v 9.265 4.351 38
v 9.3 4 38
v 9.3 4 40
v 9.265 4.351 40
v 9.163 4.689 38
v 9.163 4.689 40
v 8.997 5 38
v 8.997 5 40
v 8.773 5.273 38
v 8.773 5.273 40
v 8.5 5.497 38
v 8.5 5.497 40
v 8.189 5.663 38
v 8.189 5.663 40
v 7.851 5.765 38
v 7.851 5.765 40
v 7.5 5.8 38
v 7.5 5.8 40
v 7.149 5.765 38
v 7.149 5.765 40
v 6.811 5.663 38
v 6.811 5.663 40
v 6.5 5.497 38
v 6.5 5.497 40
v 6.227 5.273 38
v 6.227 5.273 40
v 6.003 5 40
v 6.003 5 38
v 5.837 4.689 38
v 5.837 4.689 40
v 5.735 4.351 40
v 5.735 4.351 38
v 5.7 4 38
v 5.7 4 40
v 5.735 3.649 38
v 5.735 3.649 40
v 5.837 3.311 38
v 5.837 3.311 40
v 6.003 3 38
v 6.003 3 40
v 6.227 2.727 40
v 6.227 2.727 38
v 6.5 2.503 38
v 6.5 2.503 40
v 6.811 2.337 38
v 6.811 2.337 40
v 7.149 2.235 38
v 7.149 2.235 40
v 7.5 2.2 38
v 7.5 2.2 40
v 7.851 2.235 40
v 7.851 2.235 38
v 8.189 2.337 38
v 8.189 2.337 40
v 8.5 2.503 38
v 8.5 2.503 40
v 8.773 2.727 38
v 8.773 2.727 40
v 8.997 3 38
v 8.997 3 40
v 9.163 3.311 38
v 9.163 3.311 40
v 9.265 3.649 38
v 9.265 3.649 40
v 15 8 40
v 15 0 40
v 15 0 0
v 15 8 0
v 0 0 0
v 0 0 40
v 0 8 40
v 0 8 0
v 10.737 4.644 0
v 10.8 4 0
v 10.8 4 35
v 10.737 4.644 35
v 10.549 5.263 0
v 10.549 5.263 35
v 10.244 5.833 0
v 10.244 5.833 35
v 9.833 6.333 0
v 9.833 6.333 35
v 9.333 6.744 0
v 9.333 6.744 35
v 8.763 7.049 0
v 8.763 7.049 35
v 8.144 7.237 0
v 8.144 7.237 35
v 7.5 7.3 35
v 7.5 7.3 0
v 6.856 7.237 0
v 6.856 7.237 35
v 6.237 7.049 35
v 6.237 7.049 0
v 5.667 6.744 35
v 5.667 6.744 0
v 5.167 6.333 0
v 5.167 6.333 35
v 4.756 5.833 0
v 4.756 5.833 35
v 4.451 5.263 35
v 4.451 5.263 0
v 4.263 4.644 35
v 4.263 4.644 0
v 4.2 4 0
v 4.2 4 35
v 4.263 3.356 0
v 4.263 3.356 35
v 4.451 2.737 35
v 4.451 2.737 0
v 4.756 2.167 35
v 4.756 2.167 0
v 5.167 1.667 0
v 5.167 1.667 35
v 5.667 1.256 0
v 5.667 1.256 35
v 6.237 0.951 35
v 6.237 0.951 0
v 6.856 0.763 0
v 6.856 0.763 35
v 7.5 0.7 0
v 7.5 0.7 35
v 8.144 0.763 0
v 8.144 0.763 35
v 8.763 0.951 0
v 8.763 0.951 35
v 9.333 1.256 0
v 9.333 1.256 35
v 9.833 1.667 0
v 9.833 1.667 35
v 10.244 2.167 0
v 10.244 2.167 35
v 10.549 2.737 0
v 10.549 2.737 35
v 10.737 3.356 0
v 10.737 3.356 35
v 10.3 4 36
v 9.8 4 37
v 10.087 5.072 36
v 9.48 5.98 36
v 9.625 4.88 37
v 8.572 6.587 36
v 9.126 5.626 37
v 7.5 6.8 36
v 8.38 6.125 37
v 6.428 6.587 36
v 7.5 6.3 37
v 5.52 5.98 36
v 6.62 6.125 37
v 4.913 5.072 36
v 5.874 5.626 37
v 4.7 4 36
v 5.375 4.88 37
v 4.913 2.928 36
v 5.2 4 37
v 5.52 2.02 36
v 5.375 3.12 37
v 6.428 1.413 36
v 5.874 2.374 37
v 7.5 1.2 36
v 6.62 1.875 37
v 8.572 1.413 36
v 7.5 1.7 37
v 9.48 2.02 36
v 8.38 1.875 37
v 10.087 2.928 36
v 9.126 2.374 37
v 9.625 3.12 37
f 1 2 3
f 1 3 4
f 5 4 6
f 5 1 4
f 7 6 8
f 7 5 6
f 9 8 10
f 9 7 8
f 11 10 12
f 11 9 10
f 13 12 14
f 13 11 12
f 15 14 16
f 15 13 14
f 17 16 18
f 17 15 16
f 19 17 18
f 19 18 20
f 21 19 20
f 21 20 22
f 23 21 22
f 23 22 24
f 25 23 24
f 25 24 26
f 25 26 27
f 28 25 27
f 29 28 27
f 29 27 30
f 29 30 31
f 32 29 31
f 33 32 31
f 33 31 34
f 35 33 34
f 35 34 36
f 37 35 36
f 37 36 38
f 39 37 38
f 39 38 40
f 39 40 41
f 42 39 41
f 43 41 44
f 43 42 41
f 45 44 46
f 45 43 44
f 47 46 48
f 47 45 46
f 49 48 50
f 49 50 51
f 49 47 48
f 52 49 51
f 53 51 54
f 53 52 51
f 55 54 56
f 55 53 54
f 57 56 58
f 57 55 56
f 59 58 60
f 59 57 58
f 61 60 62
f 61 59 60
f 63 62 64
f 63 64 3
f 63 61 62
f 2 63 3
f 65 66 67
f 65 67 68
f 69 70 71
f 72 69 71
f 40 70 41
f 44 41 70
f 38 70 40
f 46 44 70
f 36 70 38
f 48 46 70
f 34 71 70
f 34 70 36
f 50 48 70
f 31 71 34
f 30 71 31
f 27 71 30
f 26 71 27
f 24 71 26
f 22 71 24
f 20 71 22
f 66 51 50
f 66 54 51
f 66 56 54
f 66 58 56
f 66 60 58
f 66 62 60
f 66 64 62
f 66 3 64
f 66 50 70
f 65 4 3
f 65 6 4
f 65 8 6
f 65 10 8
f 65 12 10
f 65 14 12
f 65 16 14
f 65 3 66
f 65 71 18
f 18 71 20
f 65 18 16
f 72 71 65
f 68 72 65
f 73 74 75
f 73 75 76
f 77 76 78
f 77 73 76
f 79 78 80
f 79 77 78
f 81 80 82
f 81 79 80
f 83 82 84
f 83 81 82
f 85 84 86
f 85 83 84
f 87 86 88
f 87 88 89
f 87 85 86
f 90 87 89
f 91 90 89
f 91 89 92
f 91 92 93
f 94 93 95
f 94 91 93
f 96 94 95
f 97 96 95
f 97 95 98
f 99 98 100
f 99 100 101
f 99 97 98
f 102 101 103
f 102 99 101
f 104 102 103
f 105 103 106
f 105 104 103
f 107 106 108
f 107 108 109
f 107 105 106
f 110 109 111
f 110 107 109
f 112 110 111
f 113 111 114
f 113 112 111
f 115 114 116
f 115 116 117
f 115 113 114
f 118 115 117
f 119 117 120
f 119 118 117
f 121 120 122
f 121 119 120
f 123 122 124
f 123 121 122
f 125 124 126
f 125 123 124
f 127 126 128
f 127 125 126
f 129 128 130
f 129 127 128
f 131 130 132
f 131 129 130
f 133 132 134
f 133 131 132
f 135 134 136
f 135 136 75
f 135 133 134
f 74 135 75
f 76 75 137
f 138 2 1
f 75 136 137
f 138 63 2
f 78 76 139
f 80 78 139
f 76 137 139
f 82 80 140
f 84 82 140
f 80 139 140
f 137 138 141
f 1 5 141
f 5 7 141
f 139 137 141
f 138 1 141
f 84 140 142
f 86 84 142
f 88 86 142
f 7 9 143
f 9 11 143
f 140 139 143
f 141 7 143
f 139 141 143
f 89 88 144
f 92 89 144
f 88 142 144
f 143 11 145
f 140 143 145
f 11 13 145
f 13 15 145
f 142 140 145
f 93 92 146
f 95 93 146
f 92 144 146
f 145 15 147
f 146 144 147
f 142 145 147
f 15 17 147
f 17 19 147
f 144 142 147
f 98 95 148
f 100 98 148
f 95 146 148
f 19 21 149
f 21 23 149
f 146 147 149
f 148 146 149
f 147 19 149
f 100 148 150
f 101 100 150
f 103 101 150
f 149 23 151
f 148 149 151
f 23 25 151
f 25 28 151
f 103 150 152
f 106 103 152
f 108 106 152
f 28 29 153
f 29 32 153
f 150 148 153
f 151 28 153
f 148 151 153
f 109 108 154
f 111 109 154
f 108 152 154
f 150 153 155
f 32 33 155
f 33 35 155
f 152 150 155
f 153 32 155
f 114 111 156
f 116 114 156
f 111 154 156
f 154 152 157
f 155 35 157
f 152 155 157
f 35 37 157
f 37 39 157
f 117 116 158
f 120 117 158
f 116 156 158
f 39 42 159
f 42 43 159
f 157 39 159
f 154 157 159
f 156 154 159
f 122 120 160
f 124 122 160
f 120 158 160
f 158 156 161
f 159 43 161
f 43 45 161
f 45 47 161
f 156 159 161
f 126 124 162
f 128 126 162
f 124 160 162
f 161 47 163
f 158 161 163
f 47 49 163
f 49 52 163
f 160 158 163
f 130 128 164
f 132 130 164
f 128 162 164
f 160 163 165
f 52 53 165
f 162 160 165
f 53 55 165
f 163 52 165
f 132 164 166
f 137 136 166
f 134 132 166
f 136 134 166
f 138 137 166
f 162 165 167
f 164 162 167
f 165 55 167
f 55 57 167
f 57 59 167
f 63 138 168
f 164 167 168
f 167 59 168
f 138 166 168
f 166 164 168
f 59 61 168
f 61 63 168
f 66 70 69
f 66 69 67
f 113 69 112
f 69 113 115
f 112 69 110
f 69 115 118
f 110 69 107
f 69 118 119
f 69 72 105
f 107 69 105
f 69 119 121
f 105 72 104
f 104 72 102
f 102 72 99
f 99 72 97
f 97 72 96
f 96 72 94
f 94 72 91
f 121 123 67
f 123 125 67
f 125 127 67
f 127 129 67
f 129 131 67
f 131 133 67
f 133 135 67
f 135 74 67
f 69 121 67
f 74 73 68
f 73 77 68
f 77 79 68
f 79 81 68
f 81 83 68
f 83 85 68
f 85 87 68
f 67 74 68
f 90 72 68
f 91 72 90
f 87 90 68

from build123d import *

# Parameters (mm, degrees)
CYLINDER044_R     = 3.3
CYLINDER044_DEPTH = 35
CYLINDER043_R     = 1.8
CYLINDER043_DEPTH = 40
BOX022_W          = 15
BOX022_H          = 8
BOX022_DEPTH      = 40


with BuildPart() as cone001:
    # Cone001 → Cone001 (revolve)
    with BuildSketch(Plane(origin=(7.5, 4, 35), x_dir=(1, 0, 0), z_dir=(0, -1, 0))):
        Polygon((0, 0), (3.3, 0), (1.8, 3), (0, 3), align=None)
    revolve(axis=Axis((7.5, 4, 35), (0, 0, 1)))


with BuildPart() as cylinder009:
    # Cylinder044 → Cylinder044 (new body)
    with BuildSketch(Plane(origin=(7.5, 4, 0), x_dir=(1, 0, 0), z_dir=(0, 0, 1))):
        Circle(CYLINDER044_R)
    extrude(amount=CYLINDER044_DEPTH)


with BuildPart() as fusion016:
    # Cylinder043 → Cylinder043 (new body)
    with BuildSketch(Plane(origin=(7.5, 4, 0), x_dir=(1, 0, 0), z_dir=(0, 0, 1))):
        Circle(CYLINDER043_R)
    extrude(amount=CYLINDER043_DEPTH)

    # Fusion016: union Cone001, Cylinder009
    add(cone001.part)
    add(cylinder009.part)


with BuildPart() as top_stop_trigger_cut:
    # Box022 → Box022 (new body)
    with BuildSketch(Plane.XY):
        with Locations((7.5, 4)):
            Rectangle(BOX022_W, BOX022_H)
    extrude(amount=BOX022_DEPTH)

    # Cut016: cut Fusion016
    add(fusion016.part, mode=Mode.SUBTRACT)


solid = top_stop_trigger_cut.part
